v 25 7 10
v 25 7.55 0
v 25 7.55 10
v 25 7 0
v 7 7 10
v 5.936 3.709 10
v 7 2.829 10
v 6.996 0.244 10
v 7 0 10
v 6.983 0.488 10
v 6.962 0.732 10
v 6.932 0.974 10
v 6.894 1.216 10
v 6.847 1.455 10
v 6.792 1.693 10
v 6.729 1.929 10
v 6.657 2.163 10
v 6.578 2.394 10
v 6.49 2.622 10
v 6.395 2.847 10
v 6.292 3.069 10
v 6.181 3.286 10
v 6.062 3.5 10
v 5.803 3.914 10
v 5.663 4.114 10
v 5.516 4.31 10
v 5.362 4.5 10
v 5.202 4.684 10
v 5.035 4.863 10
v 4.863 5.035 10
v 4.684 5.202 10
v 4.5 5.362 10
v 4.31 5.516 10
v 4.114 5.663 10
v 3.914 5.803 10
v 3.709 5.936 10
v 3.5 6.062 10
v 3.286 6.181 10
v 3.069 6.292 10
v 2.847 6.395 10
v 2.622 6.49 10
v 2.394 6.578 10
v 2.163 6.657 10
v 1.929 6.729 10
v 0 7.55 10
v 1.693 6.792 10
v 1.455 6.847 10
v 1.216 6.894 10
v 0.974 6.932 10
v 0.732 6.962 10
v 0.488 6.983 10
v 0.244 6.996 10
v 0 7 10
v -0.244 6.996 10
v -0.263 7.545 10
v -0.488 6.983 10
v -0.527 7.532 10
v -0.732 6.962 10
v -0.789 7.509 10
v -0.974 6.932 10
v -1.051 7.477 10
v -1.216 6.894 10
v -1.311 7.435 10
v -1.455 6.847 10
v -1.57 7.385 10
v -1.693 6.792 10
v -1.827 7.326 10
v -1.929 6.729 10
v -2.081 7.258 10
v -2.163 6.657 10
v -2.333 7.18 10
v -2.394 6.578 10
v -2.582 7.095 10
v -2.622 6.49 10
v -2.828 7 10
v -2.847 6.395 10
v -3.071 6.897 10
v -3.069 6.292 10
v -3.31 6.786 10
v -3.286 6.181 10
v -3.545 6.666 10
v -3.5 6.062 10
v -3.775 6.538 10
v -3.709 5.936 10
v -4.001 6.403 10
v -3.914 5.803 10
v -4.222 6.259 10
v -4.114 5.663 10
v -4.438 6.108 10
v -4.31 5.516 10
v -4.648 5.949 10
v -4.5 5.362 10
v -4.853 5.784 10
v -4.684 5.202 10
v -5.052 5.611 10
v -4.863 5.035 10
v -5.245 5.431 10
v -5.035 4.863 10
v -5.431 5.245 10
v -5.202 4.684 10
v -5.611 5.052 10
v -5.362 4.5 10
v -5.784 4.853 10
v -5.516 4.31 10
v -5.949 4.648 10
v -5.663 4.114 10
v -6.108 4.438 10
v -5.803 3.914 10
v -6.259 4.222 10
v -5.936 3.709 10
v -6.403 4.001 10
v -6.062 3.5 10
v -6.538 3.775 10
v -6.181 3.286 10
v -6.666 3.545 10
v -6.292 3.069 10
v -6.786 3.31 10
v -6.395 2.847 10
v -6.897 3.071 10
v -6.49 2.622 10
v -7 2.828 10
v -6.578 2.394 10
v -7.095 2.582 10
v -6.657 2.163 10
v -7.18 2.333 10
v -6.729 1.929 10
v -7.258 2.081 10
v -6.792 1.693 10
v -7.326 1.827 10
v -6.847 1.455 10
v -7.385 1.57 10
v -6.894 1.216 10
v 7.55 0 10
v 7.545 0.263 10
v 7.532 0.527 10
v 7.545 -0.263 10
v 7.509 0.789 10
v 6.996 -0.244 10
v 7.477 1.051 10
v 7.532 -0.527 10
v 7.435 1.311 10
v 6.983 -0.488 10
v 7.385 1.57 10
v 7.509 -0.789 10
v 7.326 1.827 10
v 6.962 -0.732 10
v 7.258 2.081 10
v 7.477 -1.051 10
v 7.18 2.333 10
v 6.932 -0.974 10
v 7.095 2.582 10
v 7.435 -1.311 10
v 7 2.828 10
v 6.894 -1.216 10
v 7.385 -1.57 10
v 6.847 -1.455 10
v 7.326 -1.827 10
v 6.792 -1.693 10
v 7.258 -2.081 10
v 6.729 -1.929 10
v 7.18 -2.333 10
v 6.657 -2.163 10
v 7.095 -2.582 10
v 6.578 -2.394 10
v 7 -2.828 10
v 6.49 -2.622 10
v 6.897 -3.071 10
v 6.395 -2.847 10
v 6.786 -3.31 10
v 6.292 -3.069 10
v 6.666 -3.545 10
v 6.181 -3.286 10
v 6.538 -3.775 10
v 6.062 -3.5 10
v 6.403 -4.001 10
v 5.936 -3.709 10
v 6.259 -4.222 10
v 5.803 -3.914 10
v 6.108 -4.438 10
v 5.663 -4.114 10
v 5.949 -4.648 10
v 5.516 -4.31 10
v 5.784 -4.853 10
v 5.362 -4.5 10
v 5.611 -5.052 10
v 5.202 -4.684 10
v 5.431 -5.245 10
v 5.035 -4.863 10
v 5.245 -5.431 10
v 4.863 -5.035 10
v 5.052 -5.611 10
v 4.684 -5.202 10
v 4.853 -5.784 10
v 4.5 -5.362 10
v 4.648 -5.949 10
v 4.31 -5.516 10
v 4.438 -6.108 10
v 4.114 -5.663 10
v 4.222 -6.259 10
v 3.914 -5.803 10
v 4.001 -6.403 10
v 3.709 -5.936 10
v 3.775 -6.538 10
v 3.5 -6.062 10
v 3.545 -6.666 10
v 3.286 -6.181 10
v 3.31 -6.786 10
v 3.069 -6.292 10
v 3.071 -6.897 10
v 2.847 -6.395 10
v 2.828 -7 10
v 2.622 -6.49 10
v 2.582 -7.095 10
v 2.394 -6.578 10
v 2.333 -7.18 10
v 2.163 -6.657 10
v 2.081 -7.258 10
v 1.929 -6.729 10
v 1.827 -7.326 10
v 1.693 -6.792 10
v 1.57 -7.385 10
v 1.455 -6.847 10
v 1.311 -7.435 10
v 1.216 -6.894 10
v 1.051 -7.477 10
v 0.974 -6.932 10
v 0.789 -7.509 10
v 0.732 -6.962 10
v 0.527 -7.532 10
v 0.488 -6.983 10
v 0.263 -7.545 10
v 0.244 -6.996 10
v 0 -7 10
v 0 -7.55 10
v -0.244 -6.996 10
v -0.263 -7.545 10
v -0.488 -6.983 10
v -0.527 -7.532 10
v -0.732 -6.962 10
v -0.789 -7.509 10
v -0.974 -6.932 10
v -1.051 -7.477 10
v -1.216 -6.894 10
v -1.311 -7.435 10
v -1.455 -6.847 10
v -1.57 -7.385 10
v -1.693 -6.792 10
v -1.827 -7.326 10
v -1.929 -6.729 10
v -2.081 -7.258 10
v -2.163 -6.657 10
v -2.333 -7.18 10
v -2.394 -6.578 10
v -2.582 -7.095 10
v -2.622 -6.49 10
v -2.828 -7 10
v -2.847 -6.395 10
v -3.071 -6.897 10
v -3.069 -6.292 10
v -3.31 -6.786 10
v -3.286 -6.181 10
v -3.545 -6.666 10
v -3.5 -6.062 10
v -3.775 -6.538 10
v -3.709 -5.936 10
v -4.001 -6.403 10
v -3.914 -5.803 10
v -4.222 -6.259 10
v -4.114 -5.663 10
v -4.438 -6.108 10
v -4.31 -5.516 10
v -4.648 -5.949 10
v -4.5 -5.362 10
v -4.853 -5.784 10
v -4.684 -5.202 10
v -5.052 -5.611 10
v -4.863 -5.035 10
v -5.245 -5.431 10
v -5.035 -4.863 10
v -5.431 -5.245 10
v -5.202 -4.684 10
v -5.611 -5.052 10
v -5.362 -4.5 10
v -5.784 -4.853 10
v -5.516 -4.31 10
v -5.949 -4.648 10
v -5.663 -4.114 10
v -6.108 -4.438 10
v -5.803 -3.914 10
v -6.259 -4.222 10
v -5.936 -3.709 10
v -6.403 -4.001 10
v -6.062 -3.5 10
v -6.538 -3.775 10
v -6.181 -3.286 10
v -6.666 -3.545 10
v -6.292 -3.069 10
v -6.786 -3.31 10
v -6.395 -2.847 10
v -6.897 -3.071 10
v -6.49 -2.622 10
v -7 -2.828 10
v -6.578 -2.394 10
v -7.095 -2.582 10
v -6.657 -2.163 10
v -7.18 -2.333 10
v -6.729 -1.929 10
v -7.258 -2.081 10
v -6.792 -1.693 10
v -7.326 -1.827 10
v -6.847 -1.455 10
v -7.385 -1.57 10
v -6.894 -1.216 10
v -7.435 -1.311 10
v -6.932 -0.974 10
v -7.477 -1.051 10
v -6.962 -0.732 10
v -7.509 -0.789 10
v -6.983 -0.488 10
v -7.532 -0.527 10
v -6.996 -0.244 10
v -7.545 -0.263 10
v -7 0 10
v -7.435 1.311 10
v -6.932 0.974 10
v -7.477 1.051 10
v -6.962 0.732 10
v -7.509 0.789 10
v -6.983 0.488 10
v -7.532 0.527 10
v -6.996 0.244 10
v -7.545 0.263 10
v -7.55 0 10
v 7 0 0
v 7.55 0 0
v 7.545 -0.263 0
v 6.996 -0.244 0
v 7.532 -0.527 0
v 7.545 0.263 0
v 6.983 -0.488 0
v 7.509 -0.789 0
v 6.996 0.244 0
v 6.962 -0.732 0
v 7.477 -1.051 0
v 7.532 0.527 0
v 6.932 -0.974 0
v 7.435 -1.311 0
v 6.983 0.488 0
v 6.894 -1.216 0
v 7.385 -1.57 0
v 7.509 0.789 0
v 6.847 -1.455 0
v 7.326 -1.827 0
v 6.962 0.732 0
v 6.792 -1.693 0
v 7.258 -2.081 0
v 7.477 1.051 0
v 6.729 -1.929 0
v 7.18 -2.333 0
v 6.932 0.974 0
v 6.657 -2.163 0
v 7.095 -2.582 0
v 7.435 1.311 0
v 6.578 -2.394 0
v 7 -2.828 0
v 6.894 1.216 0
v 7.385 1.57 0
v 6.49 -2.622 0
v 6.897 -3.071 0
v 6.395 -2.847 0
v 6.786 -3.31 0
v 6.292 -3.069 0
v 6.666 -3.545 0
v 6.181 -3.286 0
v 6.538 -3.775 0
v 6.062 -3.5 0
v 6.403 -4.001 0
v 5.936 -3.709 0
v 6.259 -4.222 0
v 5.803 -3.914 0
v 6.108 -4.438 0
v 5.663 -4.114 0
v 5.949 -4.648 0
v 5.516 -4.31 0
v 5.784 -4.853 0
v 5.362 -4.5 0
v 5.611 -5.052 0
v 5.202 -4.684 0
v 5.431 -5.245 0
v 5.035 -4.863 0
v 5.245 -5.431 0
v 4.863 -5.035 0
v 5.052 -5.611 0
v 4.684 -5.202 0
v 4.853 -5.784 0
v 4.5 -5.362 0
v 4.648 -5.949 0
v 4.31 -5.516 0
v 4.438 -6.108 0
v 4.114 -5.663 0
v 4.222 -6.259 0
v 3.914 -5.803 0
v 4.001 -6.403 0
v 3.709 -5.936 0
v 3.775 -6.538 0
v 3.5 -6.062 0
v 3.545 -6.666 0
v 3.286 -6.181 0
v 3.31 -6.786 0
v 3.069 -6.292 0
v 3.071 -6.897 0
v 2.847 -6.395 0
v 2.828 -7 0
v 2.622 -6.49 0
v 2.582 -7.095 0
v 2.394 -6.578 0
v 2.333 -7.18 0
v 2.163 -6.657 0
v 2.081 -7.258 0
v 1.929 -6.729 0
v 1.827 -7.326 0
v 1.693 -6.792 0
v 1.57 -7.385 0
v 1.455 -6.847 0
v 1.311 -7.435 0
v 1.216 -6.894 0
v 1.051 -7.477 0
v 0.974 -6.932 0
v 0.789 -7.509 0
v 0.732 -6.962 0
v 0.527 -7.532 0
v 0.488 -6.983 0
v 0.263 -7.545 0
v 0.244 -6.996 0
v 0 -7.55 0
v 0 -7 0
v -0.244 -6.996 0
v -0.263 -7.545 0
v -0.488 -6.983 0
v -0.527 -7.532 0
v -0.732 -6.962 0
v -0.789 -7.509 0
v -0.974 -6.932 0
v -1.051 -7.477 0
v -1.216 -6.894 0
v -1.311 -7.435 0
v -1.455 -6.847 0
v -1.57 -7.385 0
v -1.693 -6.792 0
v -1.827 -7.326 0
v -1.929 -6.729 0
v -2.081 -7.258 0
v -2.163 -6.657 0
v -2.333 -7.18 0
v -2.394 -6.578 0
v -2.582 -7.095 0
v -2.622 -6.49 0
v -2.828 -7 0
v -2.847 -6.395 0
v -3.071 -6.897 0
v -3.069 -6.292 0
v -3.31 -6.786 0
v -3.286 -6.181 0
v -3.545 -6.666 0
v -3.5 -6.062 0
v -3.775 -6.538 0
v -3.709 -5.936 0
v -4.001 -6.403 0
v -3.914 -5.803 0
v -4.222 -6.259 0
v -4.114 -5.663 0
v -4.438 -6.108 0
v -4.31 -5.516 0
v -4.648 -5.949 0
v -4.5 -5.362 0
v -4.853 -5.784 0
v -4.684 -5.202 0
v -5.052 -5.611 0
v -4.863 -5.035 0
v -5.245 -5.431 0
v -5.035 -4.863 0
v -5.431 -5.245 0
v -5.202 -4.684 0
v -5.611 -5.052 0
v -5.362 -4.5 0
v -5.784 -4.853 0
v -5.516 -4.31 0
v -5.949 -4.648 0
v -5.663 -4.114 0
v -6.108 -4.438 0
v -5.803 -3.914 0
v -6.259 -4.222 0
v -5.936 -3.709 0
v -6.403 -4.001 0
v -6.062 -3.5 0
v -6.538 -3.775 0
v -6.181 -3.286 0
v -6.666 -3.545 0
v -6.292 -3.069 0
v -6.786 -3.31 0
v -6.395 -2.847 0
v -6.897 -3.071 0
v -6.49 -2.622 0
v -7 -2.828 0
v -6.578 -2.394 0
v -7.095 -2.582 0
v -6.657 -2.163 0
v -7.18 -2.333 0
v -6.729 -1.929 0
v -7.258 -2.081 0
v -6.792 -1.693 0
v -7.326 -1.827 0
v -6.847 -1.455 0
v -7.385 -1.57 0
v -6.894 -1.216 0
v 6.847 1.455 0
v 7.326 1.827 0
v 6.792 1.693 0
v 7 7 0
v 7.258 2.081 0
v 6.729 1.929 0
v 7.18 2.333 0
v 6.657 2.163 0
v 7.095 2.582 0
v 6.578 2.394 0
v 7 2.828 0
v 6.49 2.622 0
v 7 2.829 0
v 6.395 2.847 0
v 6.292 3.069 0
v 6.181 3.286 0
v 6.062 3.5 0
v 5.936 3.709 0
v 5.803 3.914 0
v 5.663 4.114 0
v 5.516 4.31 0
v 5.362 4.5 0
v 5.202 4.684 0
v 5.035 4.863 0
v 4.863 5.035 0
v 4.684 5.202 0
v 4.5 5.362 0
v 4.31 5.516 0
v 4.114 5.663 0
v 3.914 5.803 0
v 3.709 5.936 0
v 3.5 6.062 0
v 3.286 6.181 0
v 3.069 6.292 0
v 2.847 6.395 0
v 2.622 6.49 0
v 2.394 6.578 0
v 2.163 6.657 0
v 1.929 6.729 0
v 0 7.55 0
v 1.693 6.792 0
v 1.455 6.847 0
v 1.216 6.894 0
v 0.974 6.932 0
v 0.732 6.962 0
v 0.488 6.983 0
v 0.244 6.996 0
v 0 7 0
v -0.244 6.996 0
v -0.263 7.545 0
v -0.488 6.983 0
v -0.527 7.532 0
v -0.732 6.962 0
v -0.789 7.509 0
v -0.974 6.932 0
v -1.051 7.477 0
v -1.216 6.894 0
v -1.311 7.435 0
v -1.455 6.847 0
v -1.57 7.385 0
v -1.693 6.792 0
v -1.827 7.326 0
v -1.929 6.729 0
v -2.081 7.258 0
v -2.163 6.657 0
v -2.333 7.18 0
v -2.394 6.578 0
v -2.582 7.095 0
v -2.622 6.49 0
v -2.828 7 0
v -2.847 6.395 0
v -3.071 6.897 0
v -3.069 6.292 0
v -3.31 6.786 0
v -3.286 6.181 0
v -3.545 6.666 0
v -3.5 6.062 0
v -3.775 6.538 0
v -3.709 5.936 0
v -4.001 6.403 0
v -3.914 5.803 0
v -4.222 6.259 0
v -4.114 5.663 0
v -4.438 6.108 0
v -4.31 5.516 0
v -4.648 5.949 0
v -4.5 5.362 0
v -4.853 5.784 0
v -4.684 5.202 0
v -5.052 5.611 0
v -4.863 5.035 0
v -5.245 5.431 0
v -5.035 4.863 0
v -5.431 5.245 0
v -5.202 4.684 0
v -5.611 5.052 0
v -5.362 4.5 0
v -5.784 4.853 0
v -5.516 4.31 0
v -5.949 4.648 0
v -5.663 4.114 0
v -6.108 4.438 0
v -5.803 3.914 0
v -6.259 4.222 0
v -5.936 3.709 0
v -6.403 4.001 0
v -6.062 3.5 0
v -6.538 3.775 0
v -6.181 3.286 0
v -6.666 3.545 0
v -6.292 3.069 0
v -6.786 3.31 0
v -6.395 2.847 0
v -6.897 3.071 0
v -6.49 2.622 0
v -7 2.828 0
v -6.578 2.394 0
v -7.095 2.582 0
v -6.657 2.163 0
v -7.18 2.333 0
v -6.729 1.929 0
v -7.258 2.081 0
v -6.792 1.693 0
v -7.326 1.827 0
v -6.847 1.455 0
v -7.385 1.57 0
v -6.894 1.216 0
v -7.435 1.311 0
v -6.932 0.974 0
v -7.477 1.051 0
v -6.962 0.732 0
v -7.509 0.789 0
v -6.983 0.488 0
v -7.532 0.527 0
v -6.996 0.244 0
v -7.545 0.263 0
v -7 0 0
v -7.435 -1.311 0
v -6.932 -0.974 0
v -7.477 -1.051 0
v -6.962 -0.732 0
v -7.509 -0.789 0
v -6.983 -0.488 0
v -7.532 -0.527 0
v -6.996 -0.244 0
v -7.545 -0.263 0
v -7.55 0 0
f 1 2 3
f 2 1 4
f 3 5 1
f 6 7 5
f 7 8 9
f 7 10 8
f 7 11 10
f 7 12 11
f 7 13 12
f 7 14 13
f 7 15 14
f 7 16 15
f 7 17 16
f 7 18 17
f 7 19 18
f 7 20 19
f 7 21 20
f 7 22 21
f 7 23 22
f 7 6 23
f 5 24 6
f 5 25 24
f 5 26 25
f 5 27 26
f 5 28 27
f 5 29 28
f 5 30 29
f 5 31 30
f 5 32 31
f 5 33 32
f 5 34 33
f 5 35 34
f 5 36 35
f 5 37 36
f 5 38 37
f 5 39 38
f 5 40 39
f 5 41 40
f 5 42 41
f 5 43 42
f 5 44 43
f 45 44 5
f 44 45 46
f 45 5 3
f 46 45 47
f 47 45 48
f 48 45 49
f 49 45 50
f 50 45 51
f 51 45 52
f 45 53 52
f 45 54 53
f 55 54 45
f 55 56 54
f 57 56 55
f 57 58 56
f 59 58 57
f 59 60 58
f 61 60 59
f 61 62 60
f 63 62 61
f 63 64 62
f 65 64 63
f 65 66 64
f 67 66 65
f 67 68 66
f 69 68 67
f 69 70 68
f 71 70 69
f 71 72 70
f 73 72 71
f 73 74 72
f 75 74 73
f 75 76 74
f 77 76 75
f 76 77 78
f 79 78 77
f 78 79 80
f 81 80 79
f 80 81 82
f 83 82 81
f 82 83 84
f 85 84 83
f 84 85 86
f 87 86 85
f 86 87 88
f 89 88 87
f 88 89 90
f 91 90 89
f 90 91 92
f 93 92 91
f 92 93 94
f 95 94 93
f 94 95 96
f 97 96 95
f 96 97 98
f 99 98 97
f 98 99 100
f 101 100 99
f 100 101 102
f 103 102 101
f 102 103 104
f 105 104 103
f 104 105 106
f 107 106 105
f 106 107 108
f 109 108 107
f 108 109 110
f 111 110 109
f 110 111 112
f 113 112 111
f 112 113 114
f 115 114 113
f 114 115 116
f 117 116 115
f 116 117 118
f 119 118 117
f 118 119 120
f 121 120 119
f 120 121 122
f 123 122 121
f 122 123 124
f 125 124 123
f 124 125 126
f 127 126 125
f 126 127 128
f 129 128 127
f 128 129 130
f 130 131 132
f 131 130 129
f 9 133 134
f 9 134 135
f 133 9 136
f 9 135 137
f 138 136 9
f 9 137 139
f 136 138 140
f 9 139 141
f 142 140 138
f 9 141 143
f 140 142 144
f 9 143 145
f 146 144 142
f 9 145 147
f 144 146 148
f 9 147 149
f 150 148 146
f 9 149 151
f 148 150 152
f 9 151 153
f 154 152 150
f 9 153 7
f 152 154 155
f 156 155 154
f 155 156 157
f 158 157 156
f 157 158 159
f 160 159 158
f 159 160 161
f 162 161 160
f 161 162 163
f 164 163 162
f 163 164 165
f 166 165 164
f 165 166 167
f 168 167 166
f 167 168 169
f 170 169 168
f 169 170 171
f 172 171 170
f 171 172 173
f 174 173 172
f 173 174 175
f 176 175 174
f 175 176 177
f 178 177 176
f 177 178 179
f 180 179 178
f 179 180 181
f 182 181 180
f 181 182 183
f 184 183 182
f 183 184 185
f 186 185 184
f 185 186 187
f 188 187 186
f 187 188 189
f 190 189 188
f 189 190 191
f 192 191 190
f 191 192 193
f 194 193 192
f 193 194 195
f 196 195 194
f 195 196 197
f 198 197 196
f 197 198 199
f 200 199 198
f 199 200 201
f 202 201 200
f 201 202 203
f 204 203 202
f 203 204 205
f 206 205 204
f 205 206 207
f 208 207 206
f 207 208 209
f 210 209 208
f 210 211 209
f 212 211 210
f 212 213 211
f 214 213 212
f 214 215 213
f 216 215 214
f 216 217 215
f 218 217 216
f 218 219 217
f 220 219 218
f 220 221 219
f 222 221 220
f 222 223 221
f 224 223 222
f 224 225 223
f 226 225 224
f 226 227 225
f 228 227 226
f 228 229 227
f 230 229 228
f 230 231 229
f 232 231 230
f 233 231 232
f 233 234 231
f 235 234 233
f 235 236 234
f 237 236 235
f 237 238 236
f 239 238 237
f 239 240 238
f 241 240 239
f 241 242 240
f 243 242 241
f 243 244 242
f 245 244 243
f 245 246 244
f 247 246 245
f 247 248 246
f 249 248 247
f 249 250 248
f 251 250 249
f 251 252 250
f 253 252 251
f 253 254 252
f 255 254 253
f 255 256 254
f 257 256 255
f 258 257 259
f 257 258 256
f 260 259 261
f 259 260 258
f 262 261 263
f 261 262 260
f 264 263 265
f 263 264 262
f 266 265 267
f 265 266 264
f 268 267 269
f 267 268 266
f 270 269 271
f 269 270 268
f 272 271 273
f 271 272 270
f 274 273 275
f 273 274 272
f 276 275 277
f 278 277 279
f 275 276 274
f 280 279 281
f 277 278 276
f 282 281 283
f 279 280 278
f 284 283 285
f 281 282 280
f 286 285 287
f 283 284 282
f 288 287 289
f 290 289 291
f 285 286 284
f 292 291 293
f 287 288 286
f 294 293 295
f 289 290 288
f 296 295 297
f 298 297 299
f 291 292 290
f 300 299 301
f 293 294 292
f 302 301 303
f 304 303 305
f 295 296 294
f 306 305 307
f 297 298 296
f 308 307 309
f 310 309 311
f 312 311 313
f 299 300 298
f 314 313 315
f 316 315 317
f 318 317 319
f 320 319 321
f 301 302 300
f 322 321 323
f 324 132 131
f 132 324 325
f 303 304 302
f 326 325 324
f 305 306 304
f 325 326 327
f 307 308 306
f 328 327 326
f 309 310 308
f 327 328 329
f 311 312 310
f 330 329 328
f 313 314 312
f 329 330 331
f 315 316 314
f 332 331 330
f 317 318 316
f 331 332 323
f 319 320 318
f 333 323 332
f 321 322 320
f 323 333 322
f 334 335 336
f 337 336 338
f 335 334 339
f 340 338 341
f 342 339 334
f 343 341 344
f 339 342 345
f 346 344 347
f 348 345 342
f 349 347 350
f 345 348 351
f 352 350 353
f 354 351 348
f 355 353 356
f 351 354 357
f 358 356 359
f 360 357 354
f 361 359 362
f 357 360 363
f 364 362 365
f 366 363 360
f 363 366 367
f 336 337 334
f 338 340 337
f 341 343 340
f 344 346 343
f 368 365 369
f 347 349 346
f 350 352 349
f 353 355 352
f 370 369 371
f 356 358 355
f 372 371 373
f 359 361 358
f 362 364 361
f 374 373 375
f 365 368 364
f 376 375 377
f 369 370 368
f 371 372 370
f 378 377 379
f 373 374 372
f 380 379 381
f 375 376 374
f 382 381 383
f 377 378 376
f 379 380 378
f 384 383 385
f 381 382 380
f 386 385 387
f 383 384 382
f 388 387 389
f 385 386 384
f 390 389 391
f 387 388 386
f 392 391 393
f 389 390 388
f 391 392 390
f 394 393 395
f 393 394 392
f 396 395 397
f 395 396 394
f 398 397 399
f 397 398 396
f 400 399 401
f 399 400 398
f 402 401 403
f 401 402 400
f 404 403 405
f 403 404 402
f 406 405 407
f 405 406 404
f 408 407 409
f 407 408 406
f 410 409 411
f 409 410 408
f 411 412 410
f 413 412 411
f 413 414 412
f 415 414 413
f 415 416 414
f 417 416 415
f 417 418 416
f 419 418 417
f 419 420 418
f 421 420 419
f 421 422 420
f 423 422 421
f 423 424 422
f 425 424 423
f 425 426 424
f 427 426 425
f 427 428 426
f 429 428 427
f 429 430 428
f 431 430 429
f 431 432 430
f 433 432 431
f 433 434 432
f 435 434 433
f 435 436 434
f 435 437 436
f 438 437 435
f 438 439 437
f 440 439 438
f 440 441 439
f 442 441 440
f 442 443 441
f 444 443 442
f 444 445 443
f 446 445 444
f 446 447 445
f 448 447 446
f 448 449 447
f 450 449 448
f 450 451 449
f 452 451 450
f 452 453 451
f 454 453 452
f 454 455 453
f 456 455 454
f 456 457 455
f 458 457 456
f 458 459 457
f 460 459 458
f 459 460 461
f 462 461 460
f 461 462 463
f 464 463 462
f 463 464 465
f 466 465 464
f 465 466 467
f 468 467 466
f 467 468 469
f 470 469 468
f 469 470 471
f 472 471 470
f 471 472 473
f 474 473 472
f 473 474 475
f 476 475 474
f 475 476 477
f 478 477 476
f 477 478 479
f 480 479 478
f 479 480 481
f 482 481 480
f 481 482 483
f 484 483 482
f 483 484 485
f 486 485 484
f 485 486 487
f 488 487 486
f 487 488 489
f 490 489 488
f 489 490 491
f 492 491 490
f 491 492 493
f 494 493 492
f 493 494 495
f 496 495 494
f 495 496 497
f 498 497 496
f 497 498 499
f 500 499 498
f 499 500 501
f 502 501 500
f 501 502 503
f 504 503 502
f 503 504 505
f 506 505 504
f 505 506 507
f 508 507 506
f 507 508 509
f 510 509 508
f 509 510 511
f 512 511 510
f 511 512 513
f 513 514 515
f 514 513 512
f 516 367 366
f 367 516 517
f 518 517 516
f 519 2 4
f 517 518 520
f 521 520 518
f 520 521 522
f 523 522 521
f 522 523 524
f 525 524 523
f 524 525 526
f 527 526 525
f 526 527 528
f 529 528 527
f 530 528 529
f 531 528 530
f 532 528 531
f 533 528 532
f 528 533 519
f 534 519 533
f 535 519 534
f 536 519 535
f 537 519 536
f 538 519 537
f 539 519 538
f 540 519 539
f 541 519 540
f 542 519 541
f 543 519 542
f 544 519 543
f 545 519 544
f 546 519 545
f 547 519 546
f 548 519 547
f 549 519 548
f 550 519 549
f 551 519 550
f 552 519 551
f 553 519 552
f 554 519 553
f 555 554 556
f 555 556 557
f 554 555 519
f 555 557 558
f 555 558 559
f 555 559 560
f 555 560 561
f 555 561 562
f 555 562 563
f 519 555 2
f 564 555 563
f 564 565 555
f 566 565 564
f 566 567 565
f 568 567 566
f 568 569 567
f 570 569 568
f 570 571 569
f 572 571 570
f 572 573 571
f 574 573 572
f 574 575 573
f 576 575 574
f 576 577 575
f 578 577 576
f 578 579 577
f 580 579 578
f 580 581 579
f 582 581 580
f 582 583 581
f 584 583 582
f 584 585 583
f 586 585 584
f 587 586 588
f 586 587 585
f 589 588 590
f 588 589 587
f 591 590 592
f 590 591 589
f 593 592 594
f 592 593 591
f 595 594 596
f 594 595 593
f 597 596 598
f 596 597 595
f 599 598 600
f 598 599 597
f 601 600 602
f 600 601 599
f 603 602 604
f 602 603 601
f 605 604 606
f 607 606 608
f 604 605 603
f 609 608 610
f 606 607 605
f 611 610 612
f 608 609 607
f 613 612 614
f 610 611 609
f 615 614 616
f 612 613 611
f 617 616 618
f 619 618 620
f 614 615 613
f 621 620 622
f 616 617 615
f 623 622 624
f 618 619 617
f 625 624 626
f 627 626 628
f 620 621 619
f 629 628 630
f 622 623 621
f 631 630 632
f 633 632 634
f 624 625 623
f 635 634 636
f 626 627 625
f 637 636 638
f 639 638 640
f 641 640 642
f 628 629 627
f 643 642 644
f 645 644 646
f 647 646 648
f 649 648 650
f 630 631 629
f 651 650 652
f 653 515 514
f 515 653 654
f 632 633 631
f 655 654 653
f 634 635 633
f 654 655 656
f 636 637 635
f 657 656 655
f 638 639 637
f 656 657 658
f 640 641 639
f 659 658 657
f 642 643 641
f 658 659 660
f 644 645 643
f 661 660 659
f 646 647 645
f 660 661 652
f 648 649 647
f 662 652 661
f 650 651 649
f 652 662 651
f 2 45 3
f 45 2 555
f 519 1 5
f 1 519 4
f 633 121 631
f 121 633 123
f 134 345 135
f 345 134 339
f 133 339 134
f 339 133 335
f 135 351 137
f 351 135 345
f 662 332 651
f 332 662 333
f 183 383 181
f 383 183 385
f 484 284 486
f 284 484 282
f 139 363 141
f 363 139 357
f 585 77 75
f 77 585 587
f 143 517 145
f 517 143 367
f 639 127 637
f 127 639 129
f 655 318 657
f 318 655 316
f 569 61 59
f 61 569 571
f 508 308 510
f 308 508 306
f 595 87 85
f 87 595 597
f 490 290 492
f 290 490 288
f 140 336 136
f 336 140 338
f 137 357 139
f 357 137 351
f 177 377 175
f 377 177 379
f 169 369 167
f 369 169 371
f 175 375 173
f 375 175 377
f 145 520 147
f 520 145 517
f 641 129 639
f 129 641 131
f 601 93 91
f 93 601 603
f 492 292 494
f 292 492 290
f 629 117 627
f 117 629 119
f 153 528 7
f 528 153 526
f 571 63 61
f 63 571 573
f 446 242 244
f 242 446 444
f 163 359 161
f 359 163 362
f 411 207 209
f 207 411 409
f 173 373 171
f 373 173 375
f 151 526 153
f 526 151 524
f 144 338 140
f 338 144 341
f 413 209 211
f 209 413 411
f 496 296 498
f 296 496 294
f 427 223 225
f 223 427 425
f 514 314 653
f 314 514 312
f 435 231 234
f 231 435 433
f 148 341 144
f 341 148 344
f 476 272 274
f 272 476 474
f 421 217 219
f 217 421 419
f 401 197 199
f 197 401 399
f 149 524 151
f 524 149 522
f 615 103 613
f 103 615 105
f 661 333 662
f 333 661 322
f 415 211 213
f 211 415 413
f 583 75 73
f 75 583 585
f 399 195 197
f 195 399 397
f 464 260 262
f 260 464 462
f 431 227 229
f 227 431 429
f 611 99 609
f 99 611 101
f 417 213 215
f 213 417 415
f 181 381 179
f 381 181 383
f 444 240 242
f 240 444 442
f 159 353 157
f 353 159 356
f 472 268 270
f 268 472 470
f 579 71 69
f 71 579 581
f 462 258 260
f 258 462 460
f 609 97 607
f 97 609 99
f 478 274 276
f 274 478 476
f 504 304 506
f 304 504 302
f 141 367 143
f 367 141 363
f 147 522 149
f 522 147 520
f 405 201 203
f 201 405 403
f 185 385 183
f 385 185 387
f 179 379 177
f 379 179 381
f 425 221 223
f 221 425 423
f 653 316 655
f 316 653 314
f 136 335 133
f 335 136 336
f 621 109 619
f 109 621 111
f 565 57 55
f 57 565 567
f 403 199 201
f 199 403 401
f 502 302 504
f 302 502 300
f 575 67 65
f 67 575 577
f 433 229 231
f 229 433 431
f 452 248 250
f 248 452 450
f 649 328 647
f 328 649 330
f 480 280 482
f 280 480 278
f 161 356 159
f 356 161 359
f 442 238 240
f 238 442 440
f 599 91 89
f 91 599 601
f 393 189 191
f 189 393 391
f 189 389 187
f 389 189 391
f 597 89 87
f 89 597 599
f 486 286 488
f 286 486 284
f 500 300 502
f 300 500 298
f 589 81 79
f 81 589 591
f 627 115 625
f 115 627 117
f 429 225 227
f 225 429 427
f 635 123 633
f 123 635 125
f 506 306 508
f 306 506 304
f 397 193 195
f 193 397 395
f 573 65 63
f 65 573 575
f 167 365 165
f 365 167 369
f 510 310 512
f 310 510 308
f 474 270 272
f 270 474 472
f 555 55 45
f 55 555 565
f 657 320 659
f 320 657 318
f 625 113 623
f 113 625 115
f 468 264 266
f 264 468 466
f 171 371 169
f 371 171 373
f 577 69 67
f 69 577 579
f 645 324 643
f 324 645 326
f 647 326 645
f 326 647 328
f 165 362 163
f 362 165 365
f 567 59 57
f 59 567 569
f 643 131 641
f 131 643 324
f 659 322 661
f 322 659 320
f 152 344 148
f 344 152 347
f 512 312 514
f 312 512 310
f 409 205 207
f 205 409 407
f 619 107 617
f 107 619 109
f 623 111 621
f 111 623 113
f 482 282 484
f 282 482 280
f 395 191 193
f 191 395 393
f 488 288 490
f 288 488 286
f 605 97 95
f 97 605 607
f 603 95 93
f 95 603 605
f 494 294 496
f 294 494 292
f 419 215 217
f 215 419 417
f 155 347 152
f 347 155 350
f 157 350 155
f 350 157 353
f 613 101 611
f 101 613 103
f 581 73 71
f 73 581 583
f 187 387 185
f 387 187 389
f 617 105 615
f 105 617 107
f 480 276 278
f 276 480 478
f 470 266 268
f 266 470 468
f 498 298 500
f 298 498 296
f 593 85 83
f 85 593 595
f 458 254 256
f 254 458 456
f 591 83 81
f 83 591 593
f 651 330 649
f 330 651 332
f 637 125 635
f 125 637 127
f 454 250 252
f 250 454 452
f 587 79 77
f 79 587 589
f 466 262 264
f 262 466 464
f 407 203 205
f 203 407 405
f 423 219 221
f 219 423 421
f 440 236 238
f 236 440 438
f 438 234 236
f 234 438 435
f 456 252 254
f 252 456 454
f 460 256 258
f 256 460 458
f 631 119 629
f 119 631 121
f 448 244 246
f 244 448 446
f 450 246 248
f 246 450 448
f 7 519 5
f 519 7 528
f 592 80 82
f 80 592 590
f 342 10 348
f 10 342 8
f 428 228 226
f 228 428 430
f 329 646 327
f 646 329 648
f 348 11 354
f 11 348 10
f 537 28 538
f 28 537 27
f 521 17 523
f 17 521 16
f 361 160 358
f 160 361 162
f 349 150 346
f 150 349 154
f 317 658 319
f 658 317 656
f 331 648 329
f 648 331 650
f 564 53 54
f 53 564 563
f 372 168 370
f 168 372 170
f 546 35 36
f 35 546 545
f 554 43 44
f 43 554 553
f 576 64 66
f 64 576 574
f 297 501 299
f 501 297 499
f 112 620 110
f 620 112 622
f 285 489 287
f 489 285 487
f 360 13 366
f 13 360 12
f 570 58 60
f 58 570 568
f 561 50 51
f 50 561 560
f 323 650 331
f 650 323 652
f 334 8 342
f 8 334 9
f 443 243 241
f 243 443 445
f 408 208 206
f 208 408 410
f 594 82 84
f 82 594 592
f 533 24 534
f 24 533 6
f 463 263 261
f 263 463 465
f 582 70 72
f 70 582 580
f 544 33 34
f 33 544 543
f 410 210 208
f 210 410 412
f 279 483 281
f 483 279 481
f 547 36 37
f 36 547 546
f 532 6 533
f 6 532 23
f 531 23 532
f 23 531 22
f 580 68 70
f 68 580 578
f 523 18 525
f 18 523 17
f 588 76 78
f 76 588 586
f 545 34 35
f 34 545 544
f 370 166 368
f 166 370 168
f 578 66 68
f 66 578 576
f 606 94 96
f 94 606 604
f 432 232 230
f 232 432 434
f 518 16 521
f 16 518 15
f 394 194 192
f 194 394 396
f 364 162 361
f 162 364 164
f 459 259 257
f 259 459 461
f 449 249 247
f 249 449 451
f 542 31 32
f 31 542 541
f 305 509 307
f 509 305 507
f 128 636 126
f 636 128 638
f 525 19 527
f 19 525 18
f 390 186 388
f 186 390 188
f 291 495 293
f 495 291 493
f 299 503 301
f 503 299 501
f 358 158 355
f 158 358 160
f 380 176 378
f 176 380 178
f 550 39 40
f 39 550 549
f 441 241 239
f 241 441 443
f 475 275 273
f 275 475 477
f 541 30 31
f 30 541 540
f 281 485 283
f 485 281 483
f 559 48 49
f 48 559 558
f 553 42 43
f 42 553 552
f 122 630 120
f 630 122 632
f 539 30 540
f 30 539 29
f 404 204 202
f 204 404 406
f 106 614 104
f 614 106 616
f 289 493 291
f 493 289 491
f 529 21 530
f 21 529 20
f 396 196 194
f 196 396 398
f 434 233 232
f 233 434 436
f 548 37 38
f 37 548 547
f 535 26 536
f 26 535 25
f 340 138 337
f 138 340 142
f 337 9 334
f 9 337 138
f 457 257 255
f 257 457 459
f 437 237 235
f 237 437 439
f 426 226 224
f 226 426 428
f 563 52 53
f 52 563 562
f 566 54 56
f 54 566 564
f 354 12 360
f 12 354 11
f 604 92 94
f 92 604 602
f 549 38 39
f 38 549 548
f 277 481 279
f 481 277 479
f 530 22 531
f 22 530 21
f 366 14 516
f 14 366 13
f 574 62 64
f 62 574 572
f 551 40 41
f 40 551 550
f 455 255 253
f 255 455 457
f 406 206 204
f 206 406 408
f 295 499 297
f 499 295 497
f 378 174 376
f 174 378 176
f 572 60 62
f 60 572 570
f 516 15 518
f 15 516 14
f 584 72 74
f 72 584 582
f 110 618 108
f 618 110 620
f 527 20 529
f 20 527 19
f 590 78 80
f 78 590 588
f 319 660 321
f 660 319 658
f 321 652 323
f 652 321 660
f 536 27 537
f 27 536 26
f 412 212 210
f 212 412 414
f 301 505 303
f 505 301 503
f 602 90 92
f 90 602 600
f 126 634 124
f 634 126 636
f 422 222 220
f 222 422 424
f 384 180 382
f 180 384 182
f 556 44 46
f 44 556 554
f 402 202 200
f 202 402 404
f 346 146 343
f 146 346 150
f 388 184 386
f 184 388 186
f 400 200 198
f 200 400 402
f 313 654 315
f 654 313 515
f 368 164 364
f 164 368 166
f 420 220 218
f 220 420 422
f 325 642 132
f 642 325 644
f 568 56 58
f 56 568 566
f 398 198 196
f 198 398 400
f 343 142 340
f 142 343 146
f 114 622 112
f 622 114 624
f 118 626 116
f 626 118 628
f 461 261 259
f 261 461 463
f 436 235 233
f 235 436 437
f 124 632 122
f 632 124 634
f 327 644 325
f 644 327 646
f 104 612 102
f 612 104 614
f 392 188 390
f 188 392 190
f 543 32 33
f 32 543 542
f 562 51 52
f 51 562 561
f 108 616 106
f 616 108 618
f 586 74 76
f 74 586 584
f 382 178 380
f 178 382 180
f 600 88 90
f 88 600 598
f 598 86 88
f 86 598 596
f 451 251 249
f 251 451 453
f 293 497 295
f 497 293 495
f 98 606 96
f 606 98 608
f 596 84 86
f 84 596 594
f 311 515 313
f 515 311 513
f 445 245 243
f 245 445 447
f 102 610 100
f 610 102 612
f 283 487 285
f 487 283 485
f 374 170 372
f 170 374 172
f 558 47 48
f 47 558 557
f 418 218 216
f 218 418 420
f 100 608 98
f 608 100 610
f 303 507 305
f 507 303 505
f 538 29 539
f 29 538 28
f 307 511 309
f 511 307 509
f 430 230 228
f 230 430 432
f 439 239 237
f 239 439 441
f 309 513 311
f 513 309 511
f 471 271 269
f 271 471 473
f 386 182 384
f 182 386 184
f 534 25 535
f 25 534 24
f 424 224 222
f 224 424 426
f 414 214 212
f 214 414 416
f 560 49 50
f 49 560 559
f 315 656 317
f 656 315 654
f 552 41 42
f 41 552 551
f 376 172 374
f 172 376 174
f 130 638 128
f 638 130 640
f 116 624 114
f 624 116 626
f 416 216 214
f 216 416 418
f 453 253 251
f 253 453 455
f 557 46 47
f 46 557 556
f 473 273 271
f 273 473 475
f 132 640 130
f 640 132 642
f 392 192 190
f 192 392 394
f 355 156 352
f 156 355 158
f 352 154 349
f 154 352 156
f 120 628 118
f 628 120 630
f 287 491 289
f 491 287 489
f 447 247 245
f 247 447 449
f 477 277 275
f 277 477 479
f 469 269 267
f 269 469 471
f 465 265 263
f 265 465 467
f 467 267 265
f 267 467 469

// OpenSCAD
//Copyright Hsiao-yu Chen 2016

//Pen Loop, Style 1



//model for a simple pen loop for notebooks and journals.
//


// 
// Designed #1: for simple mounting on front of back covers of a notebook. 

//Parameters:

//height: the length of pen section to hold
height = 10;

//inner_dia : should be the diameter of pen with a bit of slack
inner_dia = 14;
//thickness : thickness of both tab and loop
thickness = 1.1;
//tab_width : how wide the tab is
tab_width = 25;


module pen_loop_1(height, inner_dia, thickness, tab_width, smoothness = 180){
    radius = inner_dia / 2.0;
    

    difference(){
        union () {
            //a tab to attach to paper
            translate([0, radius, 0])
                cube(size =[tab_width, thickness / 2.0, height]);
      
            //main body cylindar
            cylinder($fn=smoothness, h=height, d=inner_dia+thickness);
            
            //fillet
            translate([0,0 ,0]) cube(size=[radius, inner_dia / 2.0, height]);
        }; //union
        
        //hallow out inner_diameter cylindar
        cylinder($fn=smoothness,  h=height, d=inner_dia);
        };
} //module
        


//Examples:
//LAMY Safari butt
//pen_loop_1(10, 13, 1.1, 25, 180);
//LAMY Safari Cap:
//pen_loop_1(10, 15, 1.1, 25, 180);

//Rotring Artpen cap
//pen_loop_1(35, 14, 1.1, 25, 180);

pen_loop_1(height, inner_dia, thickness,tab_width);
